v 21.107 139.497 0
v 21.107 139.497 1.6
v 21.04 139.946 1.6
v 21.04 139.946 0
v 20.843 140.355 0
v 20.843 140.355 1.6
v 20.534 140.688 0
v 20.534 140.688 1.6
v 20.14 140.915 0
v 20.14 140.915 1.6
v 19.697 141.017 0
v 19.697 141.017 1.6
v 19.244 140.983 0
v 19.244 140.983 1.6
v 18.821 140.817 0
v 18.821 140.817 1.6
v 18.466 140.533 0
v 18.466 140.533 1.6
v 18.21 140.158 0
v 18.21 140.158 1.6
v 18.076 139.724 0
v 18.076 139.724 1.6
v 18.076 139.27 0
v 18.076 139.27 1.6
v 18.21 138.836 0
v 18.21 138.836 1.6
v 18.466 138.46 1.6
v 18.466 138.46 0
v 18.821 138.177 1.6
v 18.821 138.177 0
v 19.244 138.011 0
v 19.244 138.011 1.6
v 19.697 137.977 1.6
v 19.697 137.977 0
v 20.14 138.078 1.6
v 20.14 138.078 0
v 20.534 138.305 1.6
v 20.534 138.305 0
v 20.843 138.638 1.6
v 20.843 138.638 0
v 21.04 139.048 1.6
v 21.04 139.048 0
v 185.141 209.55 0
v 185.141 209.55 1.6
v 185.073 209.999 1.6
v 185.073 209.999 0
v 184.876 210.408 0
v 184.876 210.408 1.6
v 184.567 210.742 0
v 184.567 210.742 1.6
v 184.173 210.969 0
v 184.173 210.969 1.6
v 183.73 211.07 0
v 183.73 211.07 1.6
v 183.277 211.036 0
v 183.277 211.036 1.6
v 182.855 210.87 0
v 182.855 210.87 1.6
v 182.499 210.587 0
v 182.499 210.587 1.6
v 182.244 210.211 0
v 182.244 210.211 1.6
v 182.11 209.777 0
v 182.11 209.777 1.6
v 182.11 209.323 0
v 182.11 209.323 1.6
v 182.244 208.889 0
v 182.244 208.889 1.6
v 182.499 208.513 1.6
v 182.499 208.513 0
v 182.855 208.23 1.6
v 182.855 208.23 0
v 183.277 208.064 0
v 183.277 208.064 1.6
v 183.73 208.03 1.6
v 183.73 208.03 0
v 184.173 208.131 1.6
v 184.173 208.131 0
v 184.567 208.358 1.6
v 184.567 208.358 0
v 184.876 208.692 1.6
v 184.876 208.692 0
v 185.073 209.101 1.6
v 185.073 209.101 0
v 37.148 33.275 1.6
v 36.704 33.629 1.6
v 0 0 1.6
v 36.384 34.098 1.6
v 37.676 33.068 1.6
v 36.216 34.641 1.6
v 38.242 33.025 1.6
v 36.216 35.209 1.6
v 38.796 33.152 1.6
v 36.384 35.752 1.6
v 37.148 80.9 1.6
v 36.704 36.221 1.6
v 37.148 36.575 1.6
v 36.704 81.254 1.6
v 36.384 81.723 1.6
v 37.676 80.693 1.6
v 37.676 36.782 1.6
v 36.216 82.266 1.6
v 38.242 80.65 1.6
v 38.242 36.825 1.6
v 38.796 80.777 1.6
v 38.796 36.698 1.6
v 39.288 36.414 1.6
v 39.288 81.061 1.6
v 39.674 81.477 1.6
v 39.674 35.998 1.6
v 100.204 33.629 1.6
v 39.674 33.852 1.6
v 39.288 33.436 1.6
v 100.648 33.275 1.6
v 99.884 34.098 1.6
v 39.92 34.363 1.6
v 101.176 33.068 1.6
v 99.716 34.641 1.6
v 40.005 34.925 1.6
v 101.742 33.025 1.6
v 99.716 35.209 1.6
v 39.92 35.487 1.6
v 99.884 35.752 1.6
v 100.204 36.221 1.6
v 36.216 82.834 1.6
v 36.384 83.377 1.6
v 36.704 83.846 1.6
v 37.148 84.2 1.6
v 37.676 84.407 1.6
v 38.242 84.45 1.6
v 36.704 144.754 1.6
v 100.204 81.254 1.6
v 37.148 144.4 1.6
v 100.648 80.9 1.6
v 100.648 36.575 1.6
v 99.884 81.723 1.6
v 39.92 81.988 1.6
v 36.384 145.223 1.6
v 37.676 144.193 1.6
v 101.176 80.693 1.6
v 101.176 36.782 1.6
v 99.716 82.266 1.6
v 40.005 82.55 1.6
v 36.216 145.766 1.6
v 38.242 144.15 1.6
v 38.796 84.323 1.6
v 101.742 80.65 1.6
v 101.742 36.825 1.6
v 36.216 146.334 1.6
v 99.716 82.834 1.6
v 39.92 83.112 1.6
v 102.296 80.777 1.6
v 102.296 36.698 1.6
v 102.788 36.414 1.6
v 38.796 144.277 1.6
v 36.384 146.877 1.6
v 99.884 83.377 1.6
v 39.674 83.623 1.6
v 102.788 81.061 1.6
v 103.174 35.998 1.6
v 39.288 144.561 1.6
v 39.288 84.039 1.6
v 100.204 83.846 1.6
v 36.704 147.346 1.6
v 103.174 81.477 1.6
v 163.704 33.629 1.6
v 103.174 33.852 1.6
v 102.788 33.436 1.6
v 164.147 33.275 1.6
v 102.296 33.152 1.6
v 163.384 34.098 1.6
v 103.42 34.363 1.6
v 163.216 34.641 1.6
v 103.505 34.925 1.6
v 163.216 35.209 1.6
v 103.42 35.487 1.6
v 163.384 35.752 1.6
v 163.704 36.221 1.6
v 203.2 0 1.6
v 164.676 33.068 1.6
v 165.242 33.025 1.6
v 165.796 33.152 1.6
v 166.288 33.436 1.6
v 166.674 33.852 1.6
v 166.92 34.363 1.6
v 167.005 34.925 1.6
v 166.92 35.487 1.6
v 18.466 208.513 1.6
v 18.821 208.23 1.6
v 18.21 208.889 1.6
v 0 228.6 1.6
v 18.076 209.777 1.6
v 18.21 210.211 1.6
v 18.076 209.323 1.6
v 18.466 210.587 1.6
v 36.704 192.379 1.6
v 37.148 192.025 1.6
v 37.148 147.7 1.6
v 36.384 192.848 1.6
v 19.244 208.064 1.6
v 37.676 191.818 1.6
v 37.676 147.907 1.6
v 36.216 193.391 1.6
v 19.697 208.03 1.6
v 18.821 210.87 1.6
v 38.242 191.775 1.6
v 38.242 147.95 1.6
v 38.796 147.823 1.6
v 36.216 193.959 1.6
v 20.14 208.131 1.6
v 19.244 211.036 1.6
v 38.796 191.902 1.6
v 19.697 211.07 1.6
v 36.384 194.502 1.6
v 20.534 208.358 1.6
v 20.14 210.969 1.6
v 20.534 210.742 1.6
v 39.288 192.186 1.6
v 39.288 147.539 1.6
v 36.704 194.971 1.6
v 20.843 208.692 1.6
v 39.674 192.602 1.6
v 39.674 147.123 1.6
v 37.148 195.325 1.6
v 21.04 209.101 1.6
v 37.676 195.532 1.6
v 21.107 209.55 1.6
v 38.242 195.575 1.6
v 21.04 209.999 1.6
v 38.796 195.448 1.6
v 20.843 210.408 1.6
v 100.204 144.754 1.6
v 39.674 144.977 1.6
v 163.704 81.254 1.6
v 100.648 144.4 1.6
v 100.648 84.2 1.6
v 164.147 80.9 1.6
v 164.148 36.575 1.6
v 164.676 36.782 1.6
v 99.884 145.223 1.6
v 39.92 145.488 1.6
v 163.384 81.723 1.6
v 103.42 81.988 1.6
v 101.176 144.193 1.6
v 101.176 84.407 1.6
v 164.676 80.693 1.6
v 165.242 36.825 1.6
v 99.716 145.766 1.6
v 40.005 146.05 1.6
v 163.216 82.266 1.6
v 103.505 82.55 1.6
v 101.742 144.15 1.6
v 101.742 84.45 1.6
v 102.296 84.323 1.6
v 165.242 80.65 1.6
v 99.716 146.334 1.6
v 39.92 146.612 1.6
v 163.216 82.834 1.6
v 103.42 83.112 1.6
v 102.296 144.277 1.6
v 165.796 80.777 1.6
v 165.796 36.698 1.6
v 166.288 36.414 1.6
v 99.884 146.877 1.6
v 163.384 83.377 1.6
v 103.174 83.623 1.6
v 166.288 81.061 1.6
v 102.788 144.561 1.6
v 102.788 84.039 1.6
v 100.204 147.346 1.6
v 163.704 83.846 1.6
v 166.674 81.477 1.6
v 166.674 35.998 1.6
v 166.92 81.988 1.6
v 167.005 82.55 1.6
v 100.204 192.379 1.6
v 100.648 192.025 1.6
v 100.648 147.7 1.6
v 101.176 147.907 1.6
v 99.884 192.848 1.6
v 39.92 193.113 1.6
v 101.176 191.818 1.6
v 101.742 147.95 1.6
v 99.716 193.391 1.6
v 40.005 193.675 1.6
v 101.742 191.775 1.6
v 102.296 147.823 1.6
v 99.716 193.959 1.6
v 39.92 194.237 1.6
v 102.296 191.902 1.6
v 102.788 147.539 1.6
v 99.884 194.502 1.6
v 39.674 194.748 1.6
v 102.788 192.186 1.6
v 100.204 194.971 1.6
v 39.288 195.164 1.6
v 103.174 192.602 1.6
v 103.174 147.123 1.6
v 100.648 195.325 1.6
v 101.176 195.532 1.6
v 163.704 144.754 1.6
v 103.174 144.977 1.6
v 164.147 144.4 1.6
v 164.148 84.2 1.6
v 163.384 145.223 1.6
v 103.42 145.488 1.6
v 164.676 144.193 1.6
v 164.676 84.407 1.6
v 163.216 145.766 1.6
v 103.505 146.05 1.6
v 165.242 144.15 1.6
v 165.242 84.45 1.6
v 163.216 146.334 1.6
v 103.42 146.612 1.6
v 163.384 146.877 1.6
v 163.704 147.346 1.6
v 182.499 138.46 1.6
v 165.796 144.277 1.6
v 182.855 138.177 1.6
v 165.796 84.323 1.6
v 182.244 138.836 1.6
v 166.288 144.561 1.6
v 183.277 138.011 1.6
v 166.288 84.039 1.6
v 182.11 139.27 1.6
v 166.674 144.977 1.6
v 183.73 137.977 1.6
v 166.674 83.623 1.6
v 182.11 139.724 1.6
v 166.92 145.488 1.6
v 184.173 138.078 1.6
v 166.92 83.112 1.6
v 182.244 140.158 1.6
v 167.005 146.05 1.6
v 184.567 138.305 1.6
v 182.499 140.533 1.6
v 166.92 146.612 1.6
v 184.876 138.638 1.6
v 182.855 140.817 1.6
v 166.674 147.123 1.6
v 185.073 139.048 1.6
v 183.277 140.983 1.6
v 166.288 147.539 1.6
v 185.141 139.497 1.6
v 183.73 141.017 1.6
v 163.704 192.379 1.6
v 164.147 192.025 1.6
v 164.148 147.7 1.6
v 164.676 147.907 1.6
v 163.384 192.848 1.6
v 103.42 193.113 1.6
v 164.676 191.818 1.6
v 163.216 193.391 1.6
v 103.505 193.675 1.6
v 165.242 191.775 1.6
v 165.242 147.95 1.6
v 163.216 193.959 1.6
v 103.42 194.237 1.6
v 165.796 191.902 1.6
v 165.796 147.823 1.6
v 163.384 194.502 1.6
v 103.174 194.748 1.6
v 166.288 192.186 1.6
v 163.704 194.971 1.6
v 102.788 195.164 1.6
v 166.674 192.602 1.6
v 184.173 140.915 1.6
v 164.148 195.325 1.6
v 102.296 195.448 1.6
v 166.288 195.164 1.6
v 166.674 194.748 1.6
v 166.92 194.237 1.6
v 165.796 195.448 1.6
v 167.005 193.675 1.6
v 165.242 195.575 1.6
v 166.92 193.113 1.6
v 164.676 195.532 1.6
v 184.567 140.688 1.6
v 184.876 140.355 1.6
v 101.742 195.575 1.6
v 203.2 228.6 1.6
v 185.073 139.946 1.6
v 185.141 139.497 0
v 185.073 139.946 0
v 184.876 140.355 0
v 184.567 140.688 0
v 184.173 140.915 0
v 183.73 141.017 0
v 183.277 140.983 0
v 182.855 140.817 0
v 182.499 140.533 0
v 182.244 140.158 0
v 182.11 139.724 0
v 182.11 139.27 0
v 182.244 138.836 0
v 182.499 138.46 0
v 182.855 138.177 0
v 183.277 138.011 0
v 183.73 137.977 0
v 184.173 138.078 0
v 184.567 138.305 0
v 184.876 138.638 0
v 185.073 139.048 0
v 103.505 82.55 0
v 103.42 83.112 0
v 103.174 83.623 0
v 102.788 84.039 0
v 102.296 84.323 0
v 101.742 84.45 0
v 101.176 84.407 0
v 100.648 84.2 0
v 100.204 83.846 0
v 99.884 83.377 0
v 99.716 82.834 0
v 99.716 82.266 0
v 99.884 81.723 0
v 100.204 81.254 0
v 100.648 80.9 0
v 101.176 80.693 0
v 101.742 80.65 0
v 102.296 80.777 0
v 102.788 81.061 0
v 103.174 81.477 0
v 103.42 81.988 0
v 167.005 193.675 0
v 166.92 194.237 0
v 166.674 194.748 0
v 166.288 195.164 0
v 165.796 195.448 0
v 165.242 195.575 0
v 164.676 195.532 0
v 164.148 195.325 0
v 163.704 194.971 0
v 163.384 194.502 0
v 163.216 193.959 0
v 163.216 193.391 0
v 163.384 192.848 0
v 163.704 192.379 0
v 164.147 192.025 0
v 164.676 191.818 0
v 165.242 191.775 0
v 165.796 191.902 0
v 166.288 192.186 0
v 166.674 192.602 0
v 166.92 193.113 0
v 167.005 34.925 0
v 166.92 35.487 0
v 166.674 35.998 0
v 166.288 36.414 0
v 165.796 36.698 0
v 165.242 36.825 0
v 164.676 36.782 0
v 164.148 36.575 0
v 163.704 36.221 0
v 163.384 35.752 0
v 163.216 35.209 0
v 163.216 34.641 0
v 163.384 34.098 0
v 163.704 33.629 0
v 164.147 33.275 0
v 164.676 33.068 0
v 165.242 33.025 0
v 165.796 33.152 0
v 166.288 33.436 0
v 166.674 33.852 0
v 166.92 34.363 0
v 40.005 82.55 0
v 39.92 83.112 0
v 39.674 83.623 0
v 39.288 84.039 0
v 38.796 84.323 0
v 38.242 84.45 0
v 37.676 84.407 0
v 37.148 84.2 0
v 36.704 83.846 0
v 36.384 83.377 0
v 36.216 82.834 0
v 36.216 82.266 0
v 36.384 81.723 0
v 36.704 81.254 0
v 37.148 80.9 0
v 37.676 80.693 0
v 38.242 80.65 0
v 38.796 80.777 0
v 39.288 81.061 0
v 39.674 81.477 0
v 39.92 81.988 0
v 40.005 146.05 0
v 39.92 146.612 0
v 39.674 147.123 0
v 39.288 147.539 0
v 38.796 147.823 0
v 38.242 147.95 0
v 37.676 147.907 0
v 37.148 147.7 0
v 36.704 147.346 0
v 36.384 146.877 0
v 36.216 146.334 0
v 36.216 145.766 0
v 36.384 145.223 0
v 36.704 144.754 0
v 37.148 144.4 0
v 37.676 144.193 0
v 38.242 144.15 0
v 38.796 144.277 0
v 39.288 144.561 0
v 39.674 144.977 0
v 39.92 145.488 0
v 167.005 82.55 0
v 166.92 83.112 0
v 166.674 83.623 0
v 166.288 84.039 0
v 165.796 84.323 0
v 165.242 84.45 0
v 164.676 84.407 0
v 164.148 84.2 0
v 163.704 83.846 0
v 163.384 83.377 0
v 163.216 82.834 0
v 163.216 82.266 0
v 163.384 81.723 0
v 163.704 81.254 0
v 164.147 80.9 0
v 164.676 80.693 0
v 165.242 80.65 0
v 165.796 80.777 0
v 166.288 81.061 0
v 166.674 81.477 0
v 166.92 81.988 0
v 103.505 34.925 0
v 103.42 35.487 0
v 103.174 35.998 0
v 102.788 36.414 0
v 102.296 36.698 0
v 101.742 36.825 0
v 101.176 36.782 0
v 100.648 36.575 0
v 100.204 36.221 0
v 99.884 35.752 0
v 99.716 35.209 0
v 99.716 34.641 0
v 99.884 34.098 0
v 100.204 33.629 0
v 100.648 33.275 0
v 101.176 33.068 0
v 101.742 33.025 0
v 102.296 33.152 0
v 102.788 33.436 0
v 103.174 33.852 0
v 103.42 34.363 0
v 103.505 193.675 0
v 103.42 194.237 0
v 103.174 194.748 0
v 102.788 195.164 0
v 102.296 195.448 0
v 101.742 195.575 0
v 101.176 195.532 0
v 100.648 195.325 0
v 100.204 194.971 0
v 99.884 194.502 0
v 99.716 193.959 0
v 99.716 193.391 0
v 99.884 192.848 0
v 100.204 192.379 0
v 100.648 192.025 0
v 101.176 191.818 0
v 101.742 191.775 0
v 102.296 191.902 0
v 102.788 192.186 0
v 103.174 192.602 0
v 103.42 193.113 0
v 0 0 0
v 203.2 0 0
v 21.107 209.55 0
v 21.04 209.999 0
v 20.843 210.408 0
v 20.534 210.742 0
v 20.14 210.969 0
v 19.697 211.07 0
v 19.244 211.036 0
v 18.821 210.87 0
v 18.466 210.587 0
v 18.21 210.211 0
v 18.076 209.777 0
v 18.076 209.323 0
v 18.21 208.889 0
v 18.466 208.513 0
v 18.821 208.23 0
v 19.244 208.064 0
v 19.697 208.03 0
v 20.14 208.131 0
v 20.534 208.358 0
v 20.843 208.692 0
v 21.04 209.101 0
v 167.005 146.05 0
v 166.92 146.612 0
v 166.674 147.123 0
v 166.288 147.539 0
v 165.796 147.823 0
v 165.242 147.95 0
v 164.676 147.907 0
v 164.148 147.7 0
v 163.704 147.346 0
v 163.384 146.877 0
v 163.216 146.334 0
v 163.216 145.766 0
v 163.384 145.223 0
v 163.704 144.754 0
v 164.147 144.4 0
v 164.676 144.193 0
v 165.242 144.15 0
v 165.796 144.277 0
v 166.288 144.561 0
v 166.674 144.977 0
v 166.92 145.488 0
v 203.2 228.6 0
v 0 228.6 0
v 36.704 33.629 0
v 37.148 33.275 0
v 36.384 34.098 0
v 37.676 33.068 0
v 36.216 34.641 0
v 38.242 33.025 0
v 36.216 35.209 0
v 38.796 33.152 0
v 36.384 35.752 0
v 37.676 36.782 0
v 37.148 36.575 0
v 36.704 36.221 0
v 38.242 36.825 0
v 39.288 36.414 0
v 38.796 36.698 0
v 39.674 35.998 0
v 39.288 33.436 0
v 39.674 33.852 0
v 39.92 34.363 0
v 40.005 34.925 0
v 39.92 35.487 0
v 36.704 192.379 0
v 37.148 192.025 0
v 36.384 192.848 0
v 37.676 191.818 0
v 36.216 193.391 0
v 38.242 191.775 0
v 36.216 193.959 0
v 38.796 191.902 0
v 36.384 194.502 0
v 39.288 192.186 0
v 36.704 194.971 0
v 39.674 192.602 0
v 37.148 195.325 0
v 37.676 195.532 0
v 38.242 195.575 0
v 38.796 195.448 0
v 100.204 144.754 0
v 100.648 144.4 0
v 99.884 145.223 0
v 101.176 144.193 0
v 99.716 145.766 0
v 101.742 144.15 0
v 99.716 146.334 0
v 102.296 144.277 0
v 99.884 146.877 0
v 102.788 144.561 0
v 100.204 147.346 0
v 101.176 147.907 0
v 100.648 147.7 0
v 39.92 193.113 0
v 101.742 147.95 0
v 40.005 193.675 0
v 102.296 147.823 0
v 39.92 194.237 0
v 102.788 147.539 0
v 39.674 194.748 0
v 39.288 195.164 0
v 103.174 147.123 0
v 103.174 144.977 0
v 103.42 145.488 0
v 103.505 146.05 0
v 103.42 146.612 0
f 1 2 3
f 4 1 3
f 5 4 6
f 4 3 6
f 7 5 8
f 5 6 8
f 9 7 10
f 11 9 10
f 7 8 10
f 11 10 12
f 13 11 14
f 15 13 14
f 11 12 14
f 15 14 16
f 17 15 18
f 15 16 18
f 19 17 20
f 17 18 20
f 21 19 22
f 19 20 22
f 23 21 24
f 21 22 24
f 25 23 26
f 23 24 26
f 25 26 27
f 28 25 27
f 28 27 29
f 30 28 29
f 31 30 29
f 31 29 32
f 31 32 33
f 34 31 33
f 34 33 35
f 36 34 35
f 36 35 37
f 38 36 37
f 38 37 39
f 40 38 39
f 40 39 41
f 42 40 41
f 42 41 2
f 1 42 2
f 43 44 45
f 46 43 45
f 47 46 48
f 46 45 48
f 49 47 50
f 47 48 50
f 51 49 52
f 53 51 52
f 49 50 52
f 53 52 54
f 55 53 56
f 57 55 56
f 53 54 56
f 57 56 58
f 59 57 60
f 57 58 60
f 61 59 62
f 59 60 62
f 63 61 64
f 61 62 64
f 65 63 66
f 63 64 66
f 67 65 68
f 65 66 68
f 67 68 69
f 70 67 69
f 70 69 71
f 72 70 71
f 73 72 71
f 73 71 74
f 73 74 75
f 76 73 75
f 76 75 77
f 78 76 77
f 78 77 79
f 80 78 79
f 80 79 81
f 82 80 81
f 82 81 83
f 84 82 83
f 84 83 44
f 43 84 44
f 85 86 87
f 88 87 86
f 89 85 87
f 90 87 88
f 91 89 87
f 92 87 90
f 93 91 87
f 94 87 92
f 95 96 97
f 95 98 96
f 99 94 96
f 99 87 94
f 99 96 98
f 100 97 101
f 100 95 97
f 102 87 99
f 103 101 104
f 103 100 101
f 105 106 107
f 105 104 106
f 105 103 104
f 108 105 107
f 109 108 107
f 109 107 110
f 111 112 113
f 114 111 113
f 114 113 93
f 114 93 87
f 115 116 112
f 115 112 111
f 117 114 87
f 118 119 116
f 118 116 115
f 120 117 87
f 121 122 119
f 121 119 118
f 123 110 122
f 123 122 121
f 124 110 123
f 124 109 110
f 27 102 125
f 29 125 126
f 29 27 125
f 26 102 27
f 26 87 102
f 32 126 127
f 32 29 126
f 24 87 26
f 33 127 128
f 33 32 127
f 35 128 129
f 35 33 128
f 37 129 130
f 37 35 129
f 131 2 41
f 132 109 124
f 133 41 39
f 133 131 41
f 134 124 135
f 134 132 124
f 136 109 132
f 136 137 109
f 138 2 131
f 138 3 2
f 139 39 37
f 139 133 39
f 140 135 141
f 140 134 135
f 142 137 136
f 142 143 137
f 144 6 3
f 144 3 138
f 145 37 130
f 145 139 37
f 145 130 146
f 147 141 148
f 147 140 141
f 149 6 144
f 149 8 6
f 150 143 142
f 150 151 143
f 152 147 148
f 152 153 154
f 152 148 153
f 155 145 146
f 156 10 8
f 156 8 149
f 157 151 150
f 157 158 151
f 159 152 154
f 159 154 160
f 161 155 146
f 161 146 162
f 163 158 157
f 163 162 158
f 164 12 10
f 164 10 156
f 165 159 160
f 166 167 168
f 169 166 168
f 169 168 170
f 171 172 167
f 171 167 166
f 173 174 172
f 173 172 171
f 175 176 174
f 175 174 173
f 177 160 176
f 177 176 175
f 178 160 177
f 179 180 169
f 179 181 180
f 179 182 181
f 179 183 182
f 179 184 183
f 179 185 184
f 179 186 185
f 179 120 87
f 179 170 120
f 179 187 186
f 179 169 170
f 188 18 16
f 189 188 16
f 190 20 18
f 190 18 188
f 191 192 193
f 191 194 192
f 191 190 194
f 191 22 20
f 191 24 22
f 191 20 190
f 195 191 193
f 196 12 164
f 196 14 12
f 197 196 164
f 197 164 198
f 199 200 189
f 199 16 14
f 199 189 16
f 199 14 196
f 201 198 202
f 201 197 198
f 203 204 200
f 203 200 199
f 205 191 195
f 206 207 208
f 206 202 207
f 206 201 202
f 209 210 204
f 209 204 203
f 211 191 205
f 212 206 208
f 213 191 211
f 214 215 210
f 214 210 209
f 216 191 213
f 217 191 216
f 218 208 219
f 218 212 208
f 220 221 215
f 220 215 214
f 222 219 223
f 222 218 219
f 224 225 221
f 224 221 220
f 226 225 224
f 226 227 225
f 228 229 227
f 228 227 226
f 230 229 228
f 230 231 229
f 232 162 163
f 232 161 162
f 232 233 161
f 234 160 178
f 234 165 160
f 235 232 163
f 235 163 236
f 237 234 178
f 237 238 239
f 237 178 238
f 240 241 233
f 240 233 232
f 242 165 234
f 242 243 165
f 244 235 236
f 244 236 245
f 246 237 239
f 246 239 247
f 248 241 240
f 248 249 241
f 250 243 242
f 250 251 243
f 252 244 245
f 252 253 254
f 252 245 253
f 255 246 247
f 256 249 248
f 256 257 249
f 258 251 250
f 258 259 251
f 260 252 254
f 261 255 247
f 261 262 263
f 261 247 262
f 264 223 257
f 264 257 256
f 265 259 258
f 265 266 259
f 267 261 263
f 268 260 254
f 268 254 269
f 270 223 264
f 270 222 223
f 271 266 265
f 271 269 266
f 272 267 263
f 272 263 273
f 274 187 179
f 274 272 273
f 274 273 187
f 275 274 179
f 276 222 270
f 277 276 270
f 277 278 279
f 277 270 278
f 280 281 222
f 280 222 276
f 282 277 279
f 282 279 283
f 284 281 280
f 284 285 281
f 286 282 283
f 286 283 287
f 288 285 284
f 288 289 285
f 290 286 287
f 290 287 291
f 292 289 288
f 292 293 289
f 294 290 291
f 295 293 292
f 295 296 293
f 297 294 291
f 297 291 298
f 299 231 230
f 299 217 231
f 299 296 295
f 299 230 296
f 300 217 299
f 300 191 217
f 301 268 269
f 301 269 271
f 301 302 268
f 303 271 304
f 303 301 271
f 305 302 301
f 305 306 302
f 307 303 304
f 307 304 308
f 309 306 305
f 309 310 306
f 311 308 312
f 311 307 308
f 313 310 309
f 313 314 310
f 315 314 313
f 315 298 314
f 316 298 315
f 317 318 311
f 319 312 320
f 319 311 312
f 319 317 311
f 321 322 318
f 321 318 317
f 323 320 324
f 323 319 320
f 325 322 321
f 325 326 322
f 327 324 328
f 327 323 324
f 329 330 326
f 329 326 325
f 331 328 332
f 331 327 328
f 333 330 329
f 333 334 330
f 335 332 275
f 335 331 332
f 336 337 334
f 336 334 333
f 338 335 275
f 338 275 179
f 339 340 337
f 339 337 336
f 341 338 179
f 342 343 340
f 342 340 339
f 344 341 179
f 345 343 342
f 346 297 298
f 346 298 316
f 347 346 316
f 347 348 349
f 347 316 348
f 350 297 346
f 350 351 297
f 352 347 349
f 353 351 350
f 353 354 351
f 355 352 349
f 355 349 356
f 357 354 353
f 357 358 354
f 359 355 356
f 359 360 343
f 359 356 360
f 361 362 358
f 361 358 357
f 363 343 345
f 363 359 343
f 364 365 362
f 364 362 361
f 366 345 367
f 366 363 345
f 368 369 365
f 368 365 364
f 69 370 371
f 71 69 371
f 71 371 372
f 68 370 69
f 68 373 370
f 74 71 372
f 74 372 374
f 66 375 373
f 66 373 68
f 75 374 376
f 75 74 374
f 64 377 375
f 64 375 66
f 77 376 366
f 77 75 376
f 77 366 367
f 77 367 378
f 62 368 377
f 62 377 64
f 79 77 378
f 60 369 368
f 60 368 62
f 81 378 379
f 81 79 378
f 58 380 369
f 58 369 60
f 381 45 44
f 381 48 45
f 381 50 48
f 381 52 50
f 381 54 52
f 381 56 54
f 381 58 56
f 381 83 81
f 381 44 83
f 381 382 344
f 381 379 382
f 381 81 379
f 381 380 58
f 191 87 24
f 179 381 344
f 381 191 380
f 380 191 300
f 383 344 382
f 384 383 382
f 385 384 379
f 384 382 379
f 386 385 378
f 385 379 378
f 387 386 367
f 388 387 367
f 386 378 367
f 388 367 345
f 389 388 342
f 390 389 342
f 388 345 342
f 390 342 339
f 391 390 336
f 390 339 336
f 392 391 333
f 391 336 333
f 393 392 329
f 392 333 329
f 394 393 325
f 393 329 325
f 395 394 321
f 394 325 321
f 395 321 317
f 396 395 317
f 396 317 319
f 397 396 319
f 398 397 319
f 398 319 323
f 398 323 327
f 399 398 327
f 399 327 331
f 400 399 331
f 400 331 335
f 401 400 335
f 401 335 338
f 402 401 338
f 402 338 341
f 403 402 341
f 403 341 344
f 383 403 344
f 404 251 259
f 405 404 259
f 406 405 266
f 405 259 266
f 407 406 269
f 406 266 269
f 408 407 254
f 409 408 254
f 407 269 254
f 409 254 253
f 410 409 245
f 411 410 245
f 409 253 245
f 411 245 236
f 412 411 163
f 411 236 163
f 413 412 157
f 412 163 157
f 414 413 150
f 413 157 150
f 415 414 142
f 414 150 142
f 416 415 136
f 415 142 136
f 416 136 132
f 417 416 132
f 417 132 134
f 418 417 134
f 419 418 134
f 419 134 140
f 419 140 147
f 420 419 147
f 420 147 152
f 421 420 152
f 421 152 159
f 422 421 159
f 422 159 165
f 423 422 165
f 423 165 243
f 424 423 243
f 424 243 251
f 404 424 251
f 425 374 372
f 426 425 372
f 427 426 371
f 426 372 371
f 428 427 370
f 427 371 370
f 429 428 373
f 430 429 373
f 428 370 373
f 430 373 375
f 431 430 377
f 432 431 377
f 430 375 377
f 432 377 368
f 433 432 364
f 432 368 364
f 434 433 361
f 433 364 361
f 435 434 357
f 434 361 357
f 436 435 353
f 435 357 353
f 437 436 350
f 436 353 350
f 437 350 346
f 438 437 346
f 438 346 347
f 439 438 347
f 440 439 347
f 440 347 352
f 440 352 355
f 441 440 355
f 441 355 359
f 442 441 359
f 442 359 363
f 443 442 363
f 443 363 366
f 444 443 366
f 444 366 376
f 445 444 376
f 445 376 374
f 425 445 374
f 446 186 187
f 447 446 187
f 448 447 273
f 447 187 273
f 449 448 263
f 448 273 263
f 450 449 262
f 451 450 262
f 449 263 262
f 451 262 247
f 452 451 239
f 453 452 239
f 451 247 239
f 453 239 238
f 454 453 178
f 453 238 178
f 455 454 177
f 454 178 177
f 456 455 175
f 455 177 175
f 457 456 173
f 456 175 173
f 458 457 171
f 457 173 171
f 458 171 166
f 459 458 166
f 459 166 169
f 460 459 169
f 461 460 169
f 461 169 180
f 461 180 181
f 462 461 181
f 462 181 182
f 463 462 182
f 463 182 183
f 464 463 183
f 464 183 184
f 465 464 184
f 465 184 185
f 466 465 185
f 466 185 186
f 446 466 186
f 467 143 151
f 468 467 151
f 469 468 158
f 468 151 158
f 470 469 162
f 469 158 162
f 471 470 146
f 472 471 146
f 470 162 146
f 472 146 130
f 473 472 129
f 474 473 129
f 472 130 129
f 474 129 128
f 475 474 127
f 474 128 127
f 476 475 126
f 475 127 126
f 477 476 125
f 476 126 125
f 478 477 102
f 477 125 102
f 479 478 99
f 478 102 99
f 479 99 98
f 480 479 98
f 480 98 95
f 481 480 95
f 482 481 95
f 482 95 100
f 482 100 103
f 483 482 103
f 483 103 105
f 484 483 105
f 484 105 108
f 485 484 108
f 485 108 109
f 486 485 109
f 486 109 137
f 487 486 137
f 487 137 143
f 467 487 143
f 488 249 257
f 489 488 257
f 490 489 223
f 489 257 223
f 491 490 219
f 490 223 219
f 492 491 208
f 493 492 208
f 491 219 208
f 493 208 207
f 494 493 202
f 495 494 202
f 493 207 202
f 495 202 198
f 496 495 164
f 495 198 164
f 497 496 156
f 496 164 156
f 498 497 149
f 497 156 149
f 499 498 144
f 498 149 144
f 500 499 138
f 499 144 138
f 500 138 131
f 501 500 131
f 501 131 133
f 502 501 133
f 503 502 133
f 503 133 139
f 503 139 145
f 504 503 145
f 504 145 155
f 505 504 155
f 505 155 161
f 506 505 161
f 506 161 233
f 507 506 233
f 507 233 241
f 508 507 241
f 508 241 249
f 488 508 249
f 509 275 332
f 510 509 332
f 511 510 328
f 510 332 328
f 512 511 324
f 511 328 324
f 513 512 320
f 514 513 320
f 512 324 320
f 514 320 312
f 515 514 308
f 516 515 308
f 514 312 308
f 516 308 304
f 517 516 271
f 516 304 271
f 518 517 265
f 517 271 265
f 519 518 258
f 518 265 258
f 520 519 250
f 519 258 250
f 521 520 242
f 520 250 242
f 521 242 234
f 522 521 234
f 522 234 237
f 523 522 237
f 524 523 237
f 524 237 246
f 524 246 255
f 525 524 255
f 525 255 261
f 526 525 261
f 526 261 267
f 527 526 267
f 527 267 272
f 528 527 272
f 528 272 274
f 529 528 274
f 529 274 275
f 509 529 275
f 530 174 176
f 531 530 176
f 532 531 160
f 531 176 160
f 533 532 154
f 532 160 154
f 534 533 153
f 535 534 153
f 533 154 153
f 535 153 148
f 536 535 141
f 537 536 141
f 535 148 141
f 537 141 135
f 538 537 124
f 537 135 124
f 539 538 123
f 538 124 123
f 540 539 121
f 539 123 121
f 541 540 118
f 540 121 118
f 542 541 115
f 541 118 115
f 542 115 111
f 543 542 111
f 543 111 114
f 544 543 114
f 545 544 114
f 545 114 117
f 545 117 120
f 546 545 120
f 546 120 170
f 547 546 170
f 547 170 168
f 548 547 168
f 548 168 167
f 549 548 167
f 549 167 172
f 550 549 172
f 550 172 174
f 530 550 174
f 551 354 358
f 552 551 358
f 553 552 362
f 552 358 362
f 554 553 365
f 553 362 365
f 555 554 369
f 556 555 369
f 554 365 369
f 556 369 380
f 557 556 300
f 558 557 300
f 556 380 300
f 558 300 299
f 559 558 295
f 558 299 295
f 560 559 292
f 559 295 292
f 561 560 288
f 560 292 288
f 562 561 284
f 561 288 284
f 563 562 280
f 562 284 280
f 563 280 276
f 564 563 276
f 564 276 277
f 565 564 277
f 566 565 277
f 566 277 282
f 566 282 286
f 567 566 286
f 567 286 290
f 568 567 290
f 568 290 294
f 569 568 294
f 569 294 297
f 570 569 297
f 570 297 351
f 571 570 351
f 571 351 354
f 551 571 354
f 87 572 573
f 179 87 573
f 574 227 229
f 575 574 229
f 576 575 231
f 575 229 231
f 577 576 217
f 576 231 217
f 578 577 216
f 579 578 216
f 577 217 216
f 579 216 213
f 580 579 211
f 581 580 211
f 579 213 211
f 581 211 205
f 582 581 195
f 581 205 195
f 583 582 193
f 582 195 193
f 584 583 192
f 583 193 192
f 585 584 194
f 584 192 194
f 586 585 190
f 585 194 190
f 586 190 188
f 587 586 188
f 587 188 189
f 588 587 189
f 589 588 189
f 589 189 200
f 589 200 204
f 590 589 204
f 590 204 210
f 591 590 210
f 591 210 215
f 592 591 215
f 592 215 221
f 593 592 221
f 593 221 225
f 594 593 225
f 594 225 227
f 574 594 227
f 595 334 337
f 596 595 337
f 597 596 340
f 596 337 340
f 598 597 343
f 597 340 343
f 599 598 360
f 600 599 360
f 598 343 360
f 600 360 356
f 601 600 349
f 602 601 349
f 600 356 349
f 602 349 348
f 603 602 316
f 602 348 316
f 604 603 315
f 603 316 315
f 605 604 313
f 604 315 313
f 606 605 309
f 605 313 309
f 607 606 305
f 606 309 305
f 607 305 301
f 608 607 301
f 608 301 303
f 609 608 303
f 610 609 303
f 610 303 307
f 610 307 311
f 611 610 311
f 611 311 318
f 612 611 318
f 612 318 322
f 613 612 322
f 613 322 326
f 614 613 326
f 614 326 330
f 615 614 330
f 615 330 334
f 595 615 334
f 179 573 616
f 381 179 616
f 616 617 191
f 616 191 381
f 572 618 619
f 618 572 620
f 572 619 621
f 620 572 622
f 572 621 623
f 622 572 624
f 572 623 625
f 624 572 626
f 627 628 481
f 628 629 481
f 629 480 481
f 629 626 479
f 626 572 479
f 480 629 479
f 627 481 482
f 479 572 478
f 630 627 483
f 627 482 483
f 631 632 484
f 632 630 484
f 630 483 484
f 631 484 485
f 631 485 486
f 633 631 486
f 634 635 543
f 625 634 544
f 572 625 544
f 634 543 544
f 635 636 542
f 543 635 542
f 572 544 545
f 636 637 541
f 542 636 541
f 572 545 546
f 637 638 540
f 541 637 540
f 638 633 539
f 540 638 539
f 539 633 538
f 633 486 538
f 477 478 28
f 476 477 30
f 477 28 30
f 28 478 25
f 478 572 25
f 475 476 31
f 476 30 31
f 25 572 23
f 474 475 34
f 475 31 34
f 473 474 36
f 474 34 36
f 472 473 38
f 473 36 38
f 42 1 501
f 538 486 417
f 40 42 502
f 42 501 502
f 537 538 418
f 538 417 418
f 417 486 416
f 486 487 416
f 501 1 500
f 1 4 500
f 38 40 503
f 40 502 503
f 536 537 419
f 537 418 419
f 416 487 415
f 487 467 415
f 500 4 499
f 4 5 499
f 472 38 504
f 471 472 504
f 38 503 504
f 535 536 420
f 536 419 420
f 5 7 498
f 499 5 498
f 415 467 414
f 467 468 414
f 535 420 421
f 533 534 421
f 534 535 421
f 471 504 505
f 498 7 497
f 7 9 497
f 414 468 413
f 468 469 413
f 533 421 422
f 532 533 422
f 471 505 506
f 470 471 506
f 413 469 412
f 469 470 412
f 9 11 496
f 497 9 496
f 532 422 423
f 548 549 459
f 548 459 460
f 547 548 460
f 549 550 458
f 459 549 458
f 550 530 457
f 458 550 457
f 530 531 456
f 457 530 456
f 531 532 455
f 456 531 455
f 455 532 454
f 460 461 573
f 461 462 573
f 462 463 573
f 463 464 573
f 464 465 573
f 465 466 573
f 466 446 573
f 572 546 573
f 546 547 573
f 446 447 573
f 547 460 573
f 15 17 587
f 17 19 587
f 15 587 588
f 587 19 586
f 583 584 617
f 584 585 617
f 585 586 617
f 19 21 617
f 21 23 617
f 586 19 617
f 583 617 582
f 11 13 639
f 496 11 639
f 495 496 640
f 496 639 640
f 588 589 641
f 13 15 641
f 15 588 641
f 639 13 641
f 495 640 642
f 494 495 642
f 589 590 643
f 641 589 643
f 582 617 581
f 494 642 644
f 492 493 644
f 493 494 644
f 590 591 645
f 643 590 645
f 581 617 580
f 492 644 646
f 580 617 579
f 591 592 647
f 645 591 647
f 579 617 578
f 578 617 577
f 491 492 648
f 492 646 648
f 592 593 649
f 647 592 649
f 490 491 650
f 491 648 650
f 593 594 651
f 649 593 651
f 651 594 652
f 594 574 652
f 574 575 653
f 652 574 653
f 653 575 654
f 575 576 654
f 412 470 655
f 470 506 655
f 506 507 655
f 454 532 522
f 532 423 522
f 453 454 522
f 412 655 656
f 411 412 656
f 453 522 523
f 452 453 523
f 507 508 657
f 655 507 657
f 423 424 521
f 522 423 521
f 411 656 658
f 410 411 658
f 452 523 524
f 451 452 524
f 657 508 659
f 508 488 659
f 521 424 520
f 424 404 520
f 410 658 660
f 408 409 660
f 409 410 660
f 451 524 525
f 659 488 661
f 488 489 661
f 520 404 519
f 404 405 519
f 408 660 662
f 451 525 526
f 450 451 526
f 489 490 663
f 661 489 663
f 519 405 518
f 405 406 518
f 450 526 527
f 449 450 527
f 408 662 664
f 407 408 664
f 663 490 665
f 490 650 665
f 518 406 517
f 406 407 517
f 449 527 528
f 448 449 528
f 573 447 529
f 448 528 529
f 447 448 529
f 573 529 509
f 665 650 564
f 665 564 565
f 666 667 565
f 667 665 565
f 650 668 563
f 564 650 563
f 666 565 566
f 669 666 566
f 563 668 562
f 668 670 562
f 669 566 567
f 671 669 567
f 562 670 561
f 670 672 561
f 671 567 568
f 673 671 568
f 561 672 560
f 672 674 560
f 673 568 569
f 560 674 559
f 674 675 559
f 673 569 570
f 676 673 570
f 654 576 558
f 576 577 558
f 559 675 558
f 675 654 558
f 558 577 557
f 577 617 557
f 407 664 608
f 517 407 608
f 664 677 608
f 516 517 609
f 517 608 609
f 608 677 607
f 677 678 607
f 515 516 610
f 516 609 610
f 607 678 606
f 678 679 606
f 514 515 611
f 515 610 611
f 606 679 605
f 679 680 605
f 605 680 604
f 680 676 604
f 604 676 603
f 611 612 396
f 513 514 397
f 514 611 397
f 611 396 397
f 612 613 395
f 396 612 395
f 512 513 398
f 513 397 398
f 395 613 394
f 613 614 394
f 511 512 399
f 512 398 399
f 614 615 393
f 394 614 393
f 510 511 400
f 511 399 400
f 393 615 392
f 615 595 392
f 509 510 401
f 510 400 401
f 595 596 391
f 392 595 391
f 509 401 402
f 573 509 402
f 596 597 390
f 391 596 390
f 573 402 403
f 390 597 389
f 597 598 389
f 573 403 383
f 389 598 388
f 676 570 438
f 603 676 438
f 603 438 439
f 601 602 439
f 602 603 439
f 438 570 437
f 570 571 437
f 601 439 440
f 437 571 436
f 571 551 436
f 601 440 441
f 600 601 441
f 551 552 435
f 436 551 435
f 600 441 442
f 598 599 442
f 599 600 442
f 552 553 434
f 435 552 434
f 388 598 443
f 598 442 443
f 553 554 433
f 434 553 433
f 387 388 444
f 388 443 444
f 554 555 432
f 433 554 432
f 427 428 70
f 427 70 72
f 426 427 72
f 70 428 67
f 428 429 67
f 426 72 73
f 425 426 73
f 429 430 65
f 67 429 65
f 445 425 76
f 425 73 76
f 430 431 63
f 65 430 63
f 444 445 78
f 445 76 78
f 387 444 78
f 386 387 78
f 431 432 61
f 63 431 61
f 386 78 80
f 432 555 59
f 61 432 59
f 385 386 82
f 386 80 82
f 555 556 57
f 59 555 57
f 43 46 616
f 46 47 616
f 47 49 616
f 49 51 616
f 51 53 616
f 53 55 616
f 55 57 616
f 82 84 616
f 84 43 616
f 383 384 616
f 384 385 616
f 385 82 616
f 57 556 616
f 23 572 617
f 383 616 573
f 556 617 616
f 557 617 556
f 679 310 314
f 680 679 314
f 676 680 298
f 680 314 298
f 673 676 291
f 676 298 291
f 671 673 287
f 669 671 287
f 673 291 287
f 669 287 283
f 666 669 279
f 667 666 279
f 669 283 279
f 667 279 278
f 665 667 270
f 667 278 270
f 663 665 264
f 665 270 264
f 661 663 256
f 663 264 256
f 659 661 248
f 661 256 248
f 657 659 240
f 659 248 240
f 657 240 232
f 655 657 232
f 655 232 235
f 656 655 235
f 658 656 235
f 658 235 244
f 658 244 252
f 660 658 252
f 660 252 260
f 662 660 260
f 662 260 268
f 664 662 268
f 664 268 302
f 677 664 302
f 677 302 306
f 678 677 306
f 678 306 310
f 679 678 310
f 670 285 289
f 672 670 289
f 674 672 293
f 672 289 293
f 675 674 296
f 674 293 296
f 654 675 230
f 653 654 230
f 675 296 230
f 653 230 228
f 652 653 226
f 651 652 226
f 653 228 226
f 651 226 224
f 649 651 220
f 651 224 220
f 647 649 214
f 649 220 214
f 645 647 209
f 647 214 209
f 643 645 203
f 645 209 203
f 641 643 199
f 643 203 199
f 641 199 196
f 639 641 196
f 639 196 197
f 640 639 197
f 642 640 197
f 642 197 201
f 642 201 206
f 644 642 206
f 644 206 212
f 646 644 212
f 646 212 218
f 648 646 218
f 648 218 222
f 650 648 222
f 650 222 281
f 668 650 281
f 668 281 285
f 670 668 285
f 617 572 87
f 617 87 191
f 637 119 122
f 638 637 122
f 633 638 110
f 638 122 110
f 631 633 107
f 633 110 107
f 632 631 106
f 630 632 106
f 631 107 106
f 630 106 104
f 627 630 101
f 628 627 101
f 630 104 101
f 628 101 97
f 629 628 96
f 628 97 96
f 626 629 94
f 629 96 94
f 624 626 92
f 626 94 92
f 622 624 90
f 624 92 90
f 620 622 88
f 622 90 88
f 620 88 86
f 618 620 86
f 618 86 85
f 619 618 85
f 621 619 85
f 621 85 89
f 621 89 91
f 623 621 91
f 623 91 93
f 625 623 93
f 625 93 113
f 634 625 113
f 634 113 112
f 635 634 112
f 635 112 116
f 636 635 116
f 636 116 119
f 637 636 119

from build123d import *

# Parameters (mm, degrees)
F0_W     = 203.2
F0_H     = 228.6
F1_DEPTH = 1.6002
F2_R     = 1.524
F3_DEPTH = 1.6012
F4_R     = 1.905
F5_DEPTH = 1.6012


with BuildPart() as f1:
    # F0 (on Top) → F1 (new body)
    with BuildSketch(Plane.XY):
        with Locations((101.6, 114.3)):
            Rectangle(F0_W, F0_H)
    extrude(amount=F1_DEPTH)

    # F2 (on face) → F3 (cut, through all)
    with BuildSketch(Plane.XY.offset(1.6002)):
        with Locations((19.5834, 209.55)):
            Circle(F2_R)
        with Locations((183.6166, 209.55)):
            Circle(F2_R)
        with Locations((19.5834, 139.4968)):
            Circle(F2_R)
        with Locations((183.6166, 139.4968)):
            Circle(F2_R)
    extrude(amount=-F3_DEPTH, mode=Mode.SUBTRACT)

    # F4 (on face) → F5 (cut, through all)
    with BuildSketch(Plane.XY.offset(1.6002)):
        with Locations((165.1, 34.925)):
            Circle(F4_R)
        with Locations((165.1, 82.55)):
            Circle(F4_R)
        with Locations((101.6, 34.925)):
            Circle(F4_R)
        with Locations((101.6, 82.55)):
            Circle(F4_R)
        with Locations((38.1, 34.925)):
            Circle(F4_R)
        with Locations((38.1, 82.55)):
            Circle(F4_R)
        with Locations((165.1, 146.05)):
            Circle(F4_R)
        with Locations((101.6, 146.05)):
            Circle(F4_R)
        with Locations((38.1, 146.05)):
            Circle(F4_R)
        with Locations((38.1, 193.675)):
            Circle(F4_R)
        with Locations((101.6, 193.675)):
            Circle(F4_R)
        with Locations((165.1, 193.675)):
            Circle(F4_R)
    extrude(amount=-F5_DEPTH, mode=Mode.SUBTRACT)


solid = f1.part
